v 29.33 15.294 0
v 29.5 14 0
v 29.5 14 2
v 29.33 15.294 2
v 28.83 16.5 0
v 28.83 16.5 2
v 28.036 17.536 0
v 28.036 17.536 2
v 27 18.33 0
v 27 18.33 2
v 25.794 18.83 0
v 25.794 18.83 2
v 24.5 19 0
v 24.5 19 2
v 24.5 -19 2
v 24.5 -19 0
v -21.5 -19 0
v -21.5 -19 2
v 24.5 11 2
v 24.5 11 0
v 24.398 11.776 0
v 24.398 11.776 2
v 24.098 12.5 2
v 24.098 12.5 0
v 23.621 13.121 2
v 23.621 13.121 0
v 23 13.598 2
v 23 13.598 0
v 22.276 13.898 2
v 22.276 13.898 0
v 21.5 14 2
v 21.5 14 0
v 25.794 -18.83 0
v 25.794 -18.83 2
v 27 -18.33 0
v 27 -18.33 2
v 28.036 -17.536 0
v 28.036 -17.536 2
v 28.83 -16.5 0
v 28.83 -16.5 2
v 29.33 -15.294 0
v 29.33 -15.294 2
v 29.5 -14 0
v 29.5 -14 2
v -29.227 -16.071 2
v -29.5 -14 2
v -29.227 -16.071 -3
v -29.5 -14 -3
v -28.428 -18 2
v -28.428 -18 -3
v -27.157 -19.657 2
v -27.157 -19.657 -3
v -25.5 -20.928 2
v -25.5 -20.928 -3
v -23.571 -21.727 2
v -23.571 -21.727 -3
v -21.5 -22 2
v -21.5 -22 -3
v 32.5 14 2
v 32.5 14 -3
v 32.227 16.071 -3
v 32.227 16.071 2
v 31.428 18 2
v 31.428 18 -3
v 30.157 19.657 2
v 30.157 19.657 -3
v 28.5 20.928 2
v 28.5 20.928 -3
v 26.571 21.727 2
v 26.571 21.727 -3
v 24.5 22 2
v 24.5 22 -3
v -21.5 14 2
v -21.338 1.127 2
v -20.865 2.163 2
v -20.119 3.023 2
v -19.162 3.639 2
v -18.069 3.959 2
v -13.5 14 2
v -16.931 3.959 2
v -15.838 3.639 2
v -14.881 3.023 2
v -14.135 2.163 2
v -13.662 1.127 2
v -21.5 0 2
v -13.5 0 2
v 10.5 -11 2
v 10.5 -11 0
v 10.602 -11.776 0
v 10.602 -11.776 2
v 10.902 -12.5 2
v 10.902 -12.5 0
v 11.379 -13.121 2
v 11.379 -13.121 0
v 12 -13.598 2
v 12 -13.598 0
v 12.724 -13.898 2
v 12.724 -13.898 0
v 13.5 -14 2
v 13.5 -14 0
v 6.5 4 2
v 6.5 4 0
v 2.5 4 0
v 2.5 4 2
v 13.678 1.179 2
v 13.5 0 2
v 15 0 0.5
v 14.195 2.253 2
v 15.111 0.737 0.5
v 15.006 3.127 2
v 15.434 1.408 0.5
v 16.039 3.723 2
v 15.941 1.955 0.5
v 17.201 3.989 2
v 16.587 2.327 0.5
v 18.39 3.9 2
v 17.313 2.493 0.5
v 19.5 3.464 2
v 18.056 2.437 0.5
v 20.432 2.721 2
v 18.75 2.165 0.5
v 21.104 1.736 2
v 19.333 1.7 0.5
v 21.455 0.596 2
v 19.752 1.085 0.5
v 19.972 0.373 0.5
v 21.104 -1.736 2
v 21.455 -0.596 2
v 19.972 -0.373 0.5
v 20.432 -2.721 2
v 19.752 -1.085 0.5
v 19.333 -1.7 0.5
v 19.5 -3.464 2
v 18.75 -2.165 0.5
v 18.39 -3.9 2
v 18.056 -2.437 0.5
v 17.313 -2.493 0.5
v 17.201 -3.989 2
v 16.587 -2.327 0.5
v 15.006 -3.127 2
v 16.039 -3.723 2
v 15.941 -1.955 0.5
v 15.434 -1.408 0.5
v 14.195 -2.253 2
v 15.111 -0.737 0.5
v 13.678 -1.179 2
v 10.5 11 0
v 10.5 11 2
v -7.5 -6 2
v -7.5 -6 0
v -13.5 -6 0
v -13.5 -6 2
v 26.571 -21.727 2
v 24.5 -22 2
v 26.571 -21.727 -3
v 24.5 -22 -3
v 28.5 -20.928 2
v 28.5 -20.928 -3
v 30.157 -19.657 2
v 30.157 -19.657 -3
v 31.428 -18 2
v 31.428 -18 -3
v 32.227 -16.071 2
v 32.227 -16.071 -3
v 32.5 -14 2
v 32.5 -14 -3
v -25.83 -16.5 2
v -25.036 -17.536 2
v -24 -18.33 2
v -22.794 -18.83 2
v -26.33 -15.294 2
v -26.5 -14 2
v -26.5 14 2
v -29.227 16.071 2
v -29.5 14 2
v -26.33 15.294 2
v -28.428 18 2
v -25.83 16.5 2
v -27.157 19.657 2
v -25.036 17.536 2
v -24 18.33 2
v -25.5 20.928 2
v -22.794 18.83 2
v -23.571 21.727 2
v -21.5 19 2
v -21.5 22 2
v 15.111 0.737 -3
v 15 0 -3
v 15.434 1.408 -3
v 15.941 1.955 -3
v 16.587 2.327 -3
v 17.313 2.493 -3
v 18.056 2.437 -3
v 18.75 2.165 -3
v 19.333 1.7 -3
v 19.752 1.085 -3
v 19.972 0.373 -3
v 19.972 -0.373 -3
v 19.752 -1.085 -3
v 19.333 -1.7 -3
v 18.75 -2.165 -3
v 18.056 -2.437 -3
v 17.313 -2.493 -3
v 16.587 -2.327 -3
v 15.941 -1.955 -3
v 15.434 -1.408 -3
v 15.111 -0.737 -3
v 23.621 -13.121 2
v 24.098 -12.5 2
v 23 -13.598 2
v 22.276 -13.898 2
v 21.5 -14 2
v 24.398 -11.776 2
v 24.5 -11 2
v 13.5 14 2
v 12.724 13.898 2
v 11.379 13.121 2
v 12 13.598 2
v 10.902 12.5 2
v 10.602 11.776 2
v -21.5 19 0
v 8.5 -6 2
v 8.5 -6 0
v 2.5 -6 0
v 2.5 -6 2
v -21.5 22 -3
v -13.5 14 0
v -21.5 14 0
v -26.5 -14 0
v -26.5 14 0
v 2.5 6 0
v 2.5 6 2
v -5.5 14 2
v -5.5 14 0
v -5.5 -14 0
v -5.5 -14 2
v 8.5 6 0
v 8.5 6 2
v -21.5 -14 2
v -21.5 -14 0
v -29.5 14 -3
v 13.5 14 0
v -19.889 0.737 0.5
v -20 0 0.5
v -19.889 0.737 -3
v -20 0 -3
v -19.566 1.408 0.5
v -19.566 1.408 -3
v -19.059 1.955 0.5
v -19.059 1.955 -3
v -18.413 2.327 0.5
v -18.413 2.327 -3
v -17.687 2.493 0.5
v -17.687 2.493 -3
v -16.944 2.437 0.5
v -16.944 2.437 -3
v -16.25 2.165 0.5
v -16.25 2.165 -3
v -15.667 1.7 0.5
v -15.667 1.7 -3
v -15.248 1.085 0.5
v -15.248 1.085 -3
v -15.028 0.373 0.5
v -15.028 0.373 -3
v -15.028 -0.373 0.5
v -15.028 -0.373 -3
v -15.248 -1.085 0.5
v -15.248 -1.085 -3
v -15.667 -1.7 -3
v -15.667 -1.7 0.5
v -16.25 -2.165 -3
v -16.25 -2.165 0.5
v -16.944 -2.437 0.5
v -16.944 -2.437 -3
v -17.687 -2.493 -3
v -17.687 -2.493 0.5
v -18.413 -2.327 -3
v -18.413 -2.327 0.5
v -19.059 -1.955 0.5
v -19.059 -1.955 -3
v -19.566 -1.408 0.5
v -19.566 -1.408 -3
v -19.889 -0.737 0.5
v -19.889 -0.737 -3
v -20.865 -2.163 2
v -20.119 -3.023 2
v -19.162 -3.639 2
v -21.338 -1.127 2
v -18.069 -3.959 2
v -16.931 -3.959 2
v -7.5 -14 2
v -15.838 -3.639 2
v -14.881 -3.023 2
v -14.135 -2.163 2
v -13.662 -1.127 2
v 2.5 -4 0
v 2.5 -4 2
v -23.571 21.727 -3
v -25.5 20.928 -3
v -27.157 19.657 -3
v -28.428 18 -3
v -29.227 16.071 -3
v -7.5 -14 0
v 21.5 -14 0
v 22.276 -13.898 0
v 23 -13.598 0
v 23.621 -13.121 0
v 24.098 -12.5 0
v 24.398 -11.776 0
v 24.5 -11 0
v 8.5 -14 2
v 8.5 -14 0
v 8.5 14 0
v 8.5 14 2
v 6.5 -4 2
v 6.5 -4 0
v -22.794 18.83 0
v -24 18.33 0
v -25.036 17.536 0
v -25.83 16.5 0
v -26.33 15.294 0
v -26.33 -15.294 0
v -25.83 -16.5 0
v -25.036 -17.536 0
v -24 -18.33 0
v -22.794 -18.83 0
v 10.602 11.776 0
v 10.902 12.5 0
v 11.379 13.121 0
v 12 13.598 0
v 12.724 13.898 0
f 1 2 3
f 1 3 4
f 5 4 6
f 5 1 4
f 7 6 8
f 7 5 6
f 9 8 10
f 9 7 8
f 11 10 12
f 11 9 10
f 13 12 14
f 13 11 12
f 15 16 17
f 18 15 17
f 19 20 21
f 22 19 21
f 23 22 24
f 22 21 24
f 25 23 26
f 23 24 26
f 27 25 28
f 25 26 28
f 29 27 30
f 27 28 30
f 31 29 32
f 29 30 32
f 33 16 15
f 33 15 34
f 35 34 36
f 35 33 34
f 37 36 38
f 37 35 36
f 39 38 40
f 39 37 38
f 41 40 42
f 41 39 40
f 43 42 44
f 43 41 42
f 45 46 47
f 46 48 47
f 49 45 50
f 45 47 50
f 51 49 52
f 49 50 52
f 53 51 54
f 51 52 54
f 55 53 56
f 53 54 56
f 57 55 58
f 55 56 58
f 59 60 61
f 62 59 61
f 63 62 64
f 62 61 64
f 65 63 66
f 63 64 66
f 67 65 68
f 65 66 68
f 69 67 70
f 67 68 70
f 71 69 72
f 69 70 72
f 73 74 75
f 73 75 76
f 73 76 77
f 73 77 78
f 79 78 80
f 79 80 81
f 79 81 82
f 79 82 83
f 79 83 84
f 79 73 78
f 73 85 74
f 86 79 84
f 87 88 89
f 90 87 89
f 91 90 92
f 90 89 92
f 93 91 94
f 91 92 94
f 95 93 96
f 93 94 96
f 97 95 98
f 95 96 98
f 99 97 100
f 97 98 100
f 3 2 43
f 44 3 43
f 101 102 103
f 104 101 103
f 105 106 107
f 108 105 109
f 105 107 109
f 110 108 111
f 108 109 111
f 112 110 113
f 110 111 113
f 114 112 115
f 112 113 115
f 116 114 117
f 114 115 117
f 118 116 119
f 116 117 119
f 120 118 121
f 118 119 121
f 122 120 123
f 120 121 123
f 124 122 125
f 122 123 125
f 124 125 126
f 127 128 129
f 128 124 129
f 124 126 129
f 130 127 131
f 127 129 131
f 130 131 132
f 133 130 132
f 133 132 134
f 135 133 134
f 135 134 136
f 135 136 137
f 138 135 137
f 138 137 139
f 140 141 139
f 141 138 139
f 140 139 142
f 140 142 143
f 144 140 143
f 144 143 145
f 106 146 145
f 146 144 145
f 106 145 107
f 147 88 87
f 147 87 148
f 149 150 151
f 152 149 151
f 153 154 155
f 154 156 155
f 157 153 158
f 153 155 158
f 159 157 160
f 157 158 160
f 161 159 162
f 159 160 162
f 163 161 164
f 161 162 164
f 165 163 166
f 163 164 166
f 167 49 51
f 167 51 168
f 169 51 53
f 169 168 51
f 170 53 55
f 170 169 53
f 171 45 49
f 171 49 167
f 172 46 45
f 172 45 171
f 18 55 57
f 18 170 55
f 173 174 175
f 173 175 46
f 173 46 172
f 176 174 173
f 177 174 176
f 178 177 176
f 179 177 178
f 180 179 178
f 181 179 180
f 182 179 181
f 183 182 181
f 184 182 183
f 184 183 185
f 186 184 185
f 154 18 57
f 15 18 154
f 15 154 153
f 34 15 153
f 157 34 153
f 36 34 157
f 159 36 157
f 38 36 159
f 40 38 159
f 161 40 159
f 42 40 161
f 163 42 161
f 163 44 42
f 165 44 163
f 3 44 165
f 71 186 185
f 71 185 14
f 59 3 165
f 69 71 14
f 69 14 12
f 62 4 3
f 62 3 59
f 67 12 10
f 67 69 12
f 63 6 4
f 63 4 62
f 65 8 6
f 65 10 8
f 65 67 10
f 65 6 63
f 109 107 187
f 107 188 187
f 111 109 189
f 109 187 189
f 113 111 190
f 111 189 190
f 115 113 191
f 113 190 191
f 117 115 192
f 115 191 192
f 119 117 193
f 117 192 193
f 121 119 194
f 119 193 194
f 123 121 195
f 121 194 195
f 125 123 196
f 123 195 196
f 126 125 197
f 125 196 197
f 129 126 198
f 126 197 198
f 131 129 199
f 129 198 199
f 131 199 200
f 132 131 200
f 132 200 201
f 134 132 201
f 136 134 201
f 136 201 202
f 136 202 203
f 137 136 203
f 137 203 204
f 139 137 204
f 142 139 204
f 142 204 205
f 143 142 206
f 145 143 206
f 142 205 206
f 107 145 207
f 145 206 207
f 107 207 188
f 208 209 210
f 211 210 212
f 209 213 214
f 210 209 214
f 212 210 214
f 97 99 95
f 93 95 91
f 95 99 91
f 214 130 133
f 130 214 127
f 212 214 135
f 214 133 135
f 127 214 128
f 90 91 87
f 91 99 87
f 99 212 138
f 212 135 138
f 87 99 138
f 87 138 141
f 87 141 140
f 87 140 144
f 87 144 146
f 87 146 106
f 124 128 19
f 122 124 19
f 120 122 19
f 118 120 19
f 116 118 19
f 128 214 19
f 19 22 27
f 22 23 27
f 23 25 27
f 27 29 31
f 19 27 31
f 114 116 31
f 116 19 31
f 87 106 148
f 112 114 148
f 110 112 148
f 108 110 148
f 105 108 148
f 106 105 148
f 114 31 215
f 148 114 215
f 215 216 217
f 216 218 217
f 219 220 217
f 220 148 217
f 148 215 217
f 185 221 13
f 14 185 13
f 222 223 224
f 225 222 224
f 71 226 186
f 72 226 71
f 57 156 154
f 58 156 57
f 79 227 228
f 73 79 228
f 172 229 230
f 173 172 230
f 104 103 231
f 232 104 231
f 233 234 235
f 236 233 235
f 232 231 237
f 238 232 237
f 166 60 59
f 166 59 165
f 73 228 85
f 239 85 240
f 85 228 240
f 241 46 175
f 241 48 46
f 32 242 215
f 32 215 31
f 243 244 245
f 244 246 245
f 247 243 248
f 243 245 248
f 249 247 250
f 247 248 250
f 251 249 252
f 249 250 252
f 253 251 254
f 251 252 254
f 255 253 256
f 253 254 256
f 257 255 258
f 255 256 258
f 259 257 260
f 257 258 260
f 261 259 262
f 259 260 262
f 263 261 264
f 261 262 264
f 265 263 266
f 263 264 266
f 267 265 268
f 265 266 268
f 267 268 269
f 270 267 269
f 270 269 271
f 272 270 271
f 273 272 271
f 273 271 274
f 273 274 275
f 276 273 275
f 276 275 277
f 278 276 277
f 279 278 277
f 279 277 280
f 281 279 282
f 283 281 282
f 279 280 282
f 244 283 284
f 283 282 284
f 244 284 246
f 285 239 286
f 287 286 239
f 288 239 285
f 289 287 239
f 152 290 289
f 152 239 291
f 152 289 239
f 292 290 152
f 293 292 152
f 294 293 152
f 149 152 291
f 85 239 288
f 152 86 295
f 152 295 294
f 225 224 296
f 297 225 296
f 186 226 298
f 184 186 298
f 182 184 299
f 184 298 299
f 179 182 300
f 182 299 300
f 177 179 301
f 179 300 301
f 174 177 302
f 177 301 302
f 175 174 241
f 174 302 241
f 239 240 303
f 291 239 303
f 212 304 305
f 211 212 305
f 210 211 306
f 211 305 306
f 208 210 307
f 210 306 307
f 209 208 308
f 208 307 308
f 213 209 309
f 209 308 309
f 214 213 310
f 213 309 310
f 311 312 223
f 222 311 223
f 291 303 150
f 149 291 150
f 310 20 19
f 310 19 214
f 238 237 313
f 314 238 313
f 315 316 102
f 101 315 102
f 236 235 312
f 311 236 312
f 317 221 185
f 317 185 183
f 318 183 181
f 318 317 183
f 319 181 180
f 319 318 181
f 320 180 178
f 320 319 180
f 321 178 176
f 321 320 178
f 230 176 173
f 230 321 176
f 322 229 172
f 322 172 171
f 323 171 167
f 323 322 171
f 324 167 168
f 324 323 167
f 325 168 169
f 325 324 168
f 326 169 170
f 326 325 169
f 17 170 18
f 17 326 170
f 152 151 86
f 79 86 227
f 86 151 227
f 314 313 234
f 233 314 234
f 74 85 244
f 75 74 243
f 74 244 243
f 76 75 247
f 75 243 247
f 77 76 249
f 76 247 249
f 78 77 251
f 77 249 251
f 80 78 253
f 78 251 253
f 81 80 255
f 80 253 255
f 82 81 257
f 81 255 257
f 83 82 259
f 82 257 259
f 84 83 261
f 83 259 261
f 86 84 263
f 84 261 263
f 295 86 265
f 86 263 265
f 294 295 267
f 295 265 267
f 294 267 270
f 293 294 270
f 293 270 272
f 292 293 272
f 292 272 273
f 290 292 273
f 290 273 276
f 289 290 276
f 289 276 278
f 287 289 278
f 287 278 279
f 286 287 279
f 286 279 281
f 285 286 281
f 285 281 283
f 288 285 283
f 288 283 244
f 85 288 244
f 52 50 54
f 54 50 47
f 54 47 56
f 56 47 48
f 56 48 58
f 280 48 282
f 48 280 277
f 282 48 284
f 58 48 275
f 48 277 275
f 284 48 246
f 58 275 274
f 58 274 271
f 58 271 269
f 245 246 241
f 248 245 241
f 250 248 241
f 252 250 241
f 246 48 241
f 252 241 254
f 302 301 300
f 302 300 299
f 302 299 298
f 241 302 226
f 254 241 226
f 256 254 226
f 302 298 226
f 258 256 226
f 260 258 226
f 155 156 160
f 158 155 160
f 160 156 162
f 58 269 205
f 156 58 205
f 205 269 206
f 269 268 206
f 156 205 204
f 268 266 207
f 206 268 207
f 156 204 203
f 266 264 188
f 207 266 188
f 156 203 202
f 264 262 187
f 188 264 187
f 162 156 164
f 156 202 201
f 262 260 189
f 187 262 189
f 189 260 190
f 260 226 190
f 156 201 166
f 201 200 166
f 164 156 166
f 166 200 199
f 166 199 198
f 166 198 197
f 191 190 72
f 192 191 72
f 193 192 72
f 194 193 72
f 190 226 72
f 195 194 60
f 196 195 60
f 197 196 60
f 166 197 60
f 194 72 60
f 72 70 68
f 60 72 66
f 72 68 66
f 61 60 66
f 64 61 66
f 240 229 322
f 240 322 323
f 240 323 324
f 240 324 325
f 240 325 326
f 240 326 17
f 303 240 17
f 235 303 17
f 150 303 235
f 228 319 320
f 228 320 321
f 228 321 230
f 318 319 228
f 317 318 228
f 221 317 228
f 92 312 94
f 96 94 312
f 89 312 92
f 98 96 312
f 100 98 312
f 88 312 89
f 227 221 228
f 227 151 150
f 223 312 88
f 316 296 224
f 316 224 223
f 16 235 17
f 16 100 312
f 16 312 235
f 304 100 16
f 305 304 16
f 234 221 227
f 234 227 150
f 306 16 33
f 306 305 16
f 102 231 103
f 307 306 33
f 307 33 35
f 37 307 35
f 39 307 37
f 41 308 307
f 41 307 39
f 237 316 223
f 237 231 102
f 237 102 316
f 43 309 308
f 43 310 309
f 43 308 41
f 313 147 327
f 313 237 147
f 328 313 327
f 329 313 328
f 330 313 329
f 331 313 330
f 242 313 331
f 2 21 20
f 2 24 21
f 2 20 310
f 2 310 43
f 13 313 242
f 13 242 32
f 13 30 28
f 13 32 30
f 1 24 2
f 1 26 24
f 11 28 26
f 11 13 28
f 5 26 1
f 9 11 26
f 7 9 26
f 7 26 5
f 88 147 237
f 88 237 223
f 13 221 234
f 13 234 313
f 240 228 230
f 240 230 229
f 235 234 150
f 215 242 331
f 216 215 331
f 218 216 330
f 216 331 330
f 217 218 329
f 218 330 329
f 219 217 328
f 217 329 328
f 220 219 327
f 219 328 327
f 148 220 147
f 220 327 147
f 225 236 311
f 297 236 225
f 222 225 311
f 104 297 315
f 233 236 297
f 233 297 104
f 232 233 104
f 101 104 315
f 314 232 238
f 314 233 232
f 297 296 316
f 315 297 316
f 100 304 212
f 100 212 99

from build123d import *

# Parameters (mm, degrees)
PAD_DEPTH        = 3
PAD001_DEPTH     = 2
HOLE_D           = 5
HOLE_DEPTH       = 25
HOLE_CSINK_D     = 8
HOLE_CSINK_ANGLE = 90


with BuildPart() as part:
    # Sketch001 → Pad (new body)
    with BuildSketch(Plane.XY):
        with BuildLine():
            ThreePointArc((-21.5, 22), (-27.156854, 19.656854), (-29.5, 14))
            Line((-29.5, -14), (-29.5, 14))
            ThreePointArc((-29.5, -14), (-27.156854, -19.656854), (-21.5, -22))
            Line((24.5, -22), (-21.5, -22))
            ThreePointArc((24.5, -22), (30.156854, -19.656854), (32.5, -14))
            Line((32.5, 14), (32.5, -14))
            ThreePointArc((32.5, 14), (30.156854, 19.656854), (24.5, 22))
            Line((-21.5, 22), (24.5, 22))
        make_face()
    extrude(amount=-PAD_DEPTH)

    # Sketch → Pad001 (join)
    with BuildSketch(Plane.XY):
        with BuildLine():
            ThreePointArc((-21.5, 22), (-27.156854, 19.656854), (-29.5, 14))
            Line((-29.5, -14), (-29.5, 14))
            ThreePointArc((-29.5, -14), (-27.156854, -19.656854), (-21.5, -22))
            Line((24.5, -22), (-21.5, -22))
            ThreePointArc((24.5, -22), (30.156854, -19.656854), (32.5, -14))
            Line((32.5, 14), (32.5, -14))
            ThreePointArc((32.5, 14), (30.156854, 19.656854), (24.5, 22))
            Line((-21.5, 22), (24.5, 22))
        make_face()
        with BuildLine():
            ThreePointArc((-26.5, -14), (-25.035534, -17.535534), (-21.5, -19))
            Line((24.5, -19), (-21.5, -19))
            ThreePointArc((24.5, -19), (28.035534, -17.535534), (29.5, -14))
            Line((29.5, 14), (29.5, -14))
            ThreePointArc((29.5, 14), (28.035534, 17.535534), (24.5, 19))
            Line((-21.5, 19), (24.5, 19))
            ThreePointArc((-21.5, 19), (-25.035534, 17.535534), (-26.5, 14))
            Line((-26.5, -14), (-26.5, 14))
        make_face(mode=Mode.SUBTRACT)
        Polygon((-21.5, 14), (-21.5, -14), (-7.5, -14), (-7.5, -6), (-13.5, -6), (-13.5, 14), align=None)
        Polygon((8.5, 14), (-5.5, 14), (-5.5, -14), (8.5, -14), (8.5, -6), (2.5, -6), (2.5, -4), (6.5, -4), (6.5, 4), (2.5, 4), (2.5, 6), (8.5, 6), align=None)
        with BuildLine():
            Line((13.5, 14), (21.5, 14))
            ThreePointArc((24.5, 11), (23.62132, 13.12132), (21.5, 14))
            Line((24.5, 11), (24.5, -11))
            ThreePointArc((21.5, -14), (23.62132, -13.12132), (24.5, -11))
            Line((21.5, -14), (13.5, -14))
            ThreePointArc((10.5, -11), (11.37868, -13.12132), (13.5, -14))
            Line((10.5, -11), (10.5, 11))
            ThreePointArc((13.5, 14), (11.37868, 13.12132), (10.5, 11))
        make_face()
    extrude(amount=PAD001_DEPTH)

    # Hole
    with Locations(Plane.XY.offset(2)):
        with Locations((-17.5, 0), (17.5, 0)):
            CounterSinkHole(HOLE_D / 2, HOLE_CSINK_D / 2, depth=HOLE_DEPTH, counter_sink_angle=HOLE_CSINK_ANGLE)


solid = part.part
